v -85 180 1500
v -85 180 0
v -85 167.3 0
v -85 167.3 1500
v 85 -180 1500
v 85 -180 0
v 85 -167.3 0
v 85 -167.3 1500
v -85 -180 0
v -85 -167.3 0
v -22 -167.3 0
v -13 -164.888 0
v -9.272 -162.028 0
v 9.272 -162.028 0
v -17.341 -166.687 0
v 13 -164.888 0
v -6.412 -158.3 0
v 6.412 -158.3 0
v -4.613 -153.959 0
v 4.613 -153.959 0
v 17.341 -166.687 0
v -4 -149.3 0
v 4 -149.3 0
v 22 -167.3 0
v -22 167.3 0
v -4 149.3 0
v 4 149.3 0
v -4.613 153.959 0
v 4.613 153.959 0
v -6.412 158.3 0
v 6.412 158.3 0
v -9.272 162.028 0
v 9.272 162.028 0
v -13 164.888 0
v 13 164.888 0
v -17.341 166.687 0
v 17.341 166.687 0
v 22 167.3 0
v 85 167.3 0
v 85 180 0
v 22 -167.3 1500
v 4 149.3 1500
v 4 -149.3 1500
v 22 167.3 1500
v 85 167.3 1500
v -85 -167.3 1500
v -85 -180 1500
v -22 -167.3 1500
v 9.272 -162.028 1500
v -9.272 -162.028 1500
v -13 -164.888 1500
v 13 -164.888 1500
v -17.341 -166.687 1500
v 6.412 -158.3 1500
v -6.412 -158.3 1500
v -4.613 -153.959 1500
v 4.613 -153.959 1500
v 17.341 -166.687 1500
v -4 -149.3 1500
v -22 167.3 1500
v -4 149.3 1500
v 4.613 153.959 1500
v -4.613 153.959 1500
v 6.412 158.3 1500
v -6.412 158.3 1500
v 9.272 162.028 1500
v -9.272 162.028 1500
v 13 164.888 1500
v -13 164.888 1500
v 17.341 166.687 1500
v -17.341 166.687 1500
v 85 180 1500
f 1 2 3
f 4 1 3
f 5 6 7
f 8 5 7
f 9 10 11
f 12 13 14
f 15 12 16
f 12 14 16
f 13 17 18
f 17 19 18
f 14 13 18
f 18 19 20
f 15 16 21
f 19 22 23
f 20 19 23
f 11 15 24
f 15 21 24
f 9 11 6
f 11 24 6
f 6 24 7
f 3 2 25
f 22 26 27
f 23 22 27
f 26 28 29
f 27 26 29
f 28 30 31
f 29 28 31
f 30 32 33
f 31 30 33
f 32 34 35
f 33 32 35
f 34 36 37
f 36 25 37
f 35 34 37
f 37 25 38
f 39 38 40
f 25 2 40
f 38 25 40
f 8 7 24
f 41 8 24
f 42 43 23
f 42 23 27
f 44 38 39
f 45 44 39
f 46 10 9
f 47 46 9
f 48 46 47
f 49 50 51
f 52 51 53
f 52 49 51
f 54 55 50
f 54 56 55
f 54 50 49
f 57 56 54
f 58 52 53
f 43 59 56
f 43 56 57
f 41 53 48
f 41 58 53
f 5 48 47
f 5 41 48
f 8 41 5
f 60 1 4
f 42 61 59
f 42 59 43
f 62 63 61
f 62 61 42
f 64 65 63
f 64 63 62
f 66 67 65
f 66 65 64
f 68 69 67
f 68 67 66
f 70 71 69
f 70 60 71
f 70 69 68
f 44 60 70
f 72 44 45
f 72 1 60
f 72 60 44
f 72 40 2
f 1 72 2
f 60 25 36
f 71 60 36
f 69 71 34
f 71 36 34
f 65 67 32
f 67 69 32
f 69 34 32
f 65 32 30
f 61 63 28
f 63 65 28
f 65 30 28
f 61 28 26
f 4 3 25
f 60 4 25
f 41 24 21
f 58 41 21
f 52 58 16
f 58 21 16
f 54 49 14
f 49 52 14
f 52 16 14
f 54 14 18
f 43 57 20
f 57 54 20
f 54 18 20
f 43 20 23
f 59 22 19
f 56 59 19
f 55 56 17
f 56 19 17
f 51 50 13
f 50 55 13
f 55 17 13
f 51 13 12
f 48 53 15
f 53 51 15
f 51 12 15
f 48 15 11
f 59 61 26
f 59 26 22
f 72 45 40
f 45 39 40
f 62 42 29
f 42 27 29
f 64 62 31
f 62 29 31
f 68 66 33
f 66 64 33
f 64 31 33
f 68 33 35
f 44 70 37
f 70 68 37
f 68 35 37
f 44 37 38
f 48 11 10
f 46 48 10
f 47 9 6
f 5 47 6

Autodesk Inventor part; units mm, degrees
ref_plane "YZ Plane" through (0, 0, 0) normal (1, 0, 0) x (0, 1, 0)
ref_plane "Start Plane" through (0, 0, 0) normal (0, 0, 1) x (1, 0, 0)
ref_plane "End Plane" through (0, 0, 1500) normal (0, 0, 1) x (1, 0, 0)
sketch "Sketch" plane through (0, 0, 0) normal (0, 0, 1) x (1, 0, 0)
  line L0 (-85, 167.3) -> (-22, 167.3)
  line L1 (-85, 180) -> (-85, 167.3)
  line L2 (85, 180) -> (-85, 180)
  line L3 (85, 167.3) -> (85, 180)
  line L4 (22, 167.3) -> (85, 167.3)
  line L5 (4, -149.3) -> (4, 149.3)
  line L6 (85, -167.3) -> (22, -167.3)
  line L7 (85, -180) -> (85, -167.3)
  line L8 (-85, -167.3) -> (-85, -180)
  line L9 (-22, -167.3) -> (-85, -167.3)
  line L10 (-4, 149.3) -> (-4, -149.3)
  line L11 (0, -252) -> (0, 252) construction
  line L12 (-4, -167.3) -> (4, -167.3) construction
  arc A0 (-22, -167.3) -> (-4, -149.3) centre (-22, -149.3) ccw
  arc A1 (-4, 149.3) -> (-22, 167.3) centre (-22, 149.3) ccw
  arc A2 (22, 167.3) -> (4, 149.3) centre (22, 149.3) ccw
  arc A3 (4, -149.3) -> (22, -167.3) centre (22, -149.3) ccw
  line L13 (-119, 0) -> (119, 0) construction
  line L14 (-85, -180) -> (85, -180)
  point P0 (-4, 167.3)
  point P1 (4, 167.3)
  point P2 (0, 0)
  point P3 (0, -167.3)
  point P4 (0, 0)
  dimension "d1" = 360
  dimension "d3" = 12.7
  dimension "d5" = 8
  dimension "d7" = 170
  dimension "d13" = 18
  dimension "d14" = 180
  dimension "d15" = 85
extrude "Body" add sketch "Sketch" along normal up to surface (1500 mm away) from surface at 0
sketch "Sketch3" plane through (0, 0, 0) normal (0, 0, 1) x (1, 0, 0)
  line L0 (0, 0) -> (10, 0)
ref_plane "Work Plane3" through (0, 0, 0) normal (0, -1, 0) x (1, 0, 0)
sketch "Sketch4" plane through (0, 0, 0) normal (0, -1, 0) x (1, 0, 0)
  line L0 (-2, 0) -> (12, 0) projected
  line L1 (-2, 1500) -> (12, 1500) projected
  dimension "d19" = 1500
equation "\"d1\" = ParH"
equation "\"d3\" = t2"
equation "\"d5\" = t1"
equation "\"d7\" = b"
equation "\"d13\" = R1"
equation "\"d14\" = 0.5 * d1"
equation "\"d15\" = 0.5 * d7"
equation "\"d8\" = G_L"
equation "\"b\" = 170"
equation "\"ParH\" = 360"
equation "\"R1\" = 18"
equation "\"G_L\" = d19"
equation "\"t1\" = 8"
equation "\"t2\" = 12.7"
equation "\"G_OFFSET_START\" = 0"
equation "\"G_OFFSET_END\" = 0"
properties part number "DIN 1025 - IPE 360-1500" material "Steel, Mild"
